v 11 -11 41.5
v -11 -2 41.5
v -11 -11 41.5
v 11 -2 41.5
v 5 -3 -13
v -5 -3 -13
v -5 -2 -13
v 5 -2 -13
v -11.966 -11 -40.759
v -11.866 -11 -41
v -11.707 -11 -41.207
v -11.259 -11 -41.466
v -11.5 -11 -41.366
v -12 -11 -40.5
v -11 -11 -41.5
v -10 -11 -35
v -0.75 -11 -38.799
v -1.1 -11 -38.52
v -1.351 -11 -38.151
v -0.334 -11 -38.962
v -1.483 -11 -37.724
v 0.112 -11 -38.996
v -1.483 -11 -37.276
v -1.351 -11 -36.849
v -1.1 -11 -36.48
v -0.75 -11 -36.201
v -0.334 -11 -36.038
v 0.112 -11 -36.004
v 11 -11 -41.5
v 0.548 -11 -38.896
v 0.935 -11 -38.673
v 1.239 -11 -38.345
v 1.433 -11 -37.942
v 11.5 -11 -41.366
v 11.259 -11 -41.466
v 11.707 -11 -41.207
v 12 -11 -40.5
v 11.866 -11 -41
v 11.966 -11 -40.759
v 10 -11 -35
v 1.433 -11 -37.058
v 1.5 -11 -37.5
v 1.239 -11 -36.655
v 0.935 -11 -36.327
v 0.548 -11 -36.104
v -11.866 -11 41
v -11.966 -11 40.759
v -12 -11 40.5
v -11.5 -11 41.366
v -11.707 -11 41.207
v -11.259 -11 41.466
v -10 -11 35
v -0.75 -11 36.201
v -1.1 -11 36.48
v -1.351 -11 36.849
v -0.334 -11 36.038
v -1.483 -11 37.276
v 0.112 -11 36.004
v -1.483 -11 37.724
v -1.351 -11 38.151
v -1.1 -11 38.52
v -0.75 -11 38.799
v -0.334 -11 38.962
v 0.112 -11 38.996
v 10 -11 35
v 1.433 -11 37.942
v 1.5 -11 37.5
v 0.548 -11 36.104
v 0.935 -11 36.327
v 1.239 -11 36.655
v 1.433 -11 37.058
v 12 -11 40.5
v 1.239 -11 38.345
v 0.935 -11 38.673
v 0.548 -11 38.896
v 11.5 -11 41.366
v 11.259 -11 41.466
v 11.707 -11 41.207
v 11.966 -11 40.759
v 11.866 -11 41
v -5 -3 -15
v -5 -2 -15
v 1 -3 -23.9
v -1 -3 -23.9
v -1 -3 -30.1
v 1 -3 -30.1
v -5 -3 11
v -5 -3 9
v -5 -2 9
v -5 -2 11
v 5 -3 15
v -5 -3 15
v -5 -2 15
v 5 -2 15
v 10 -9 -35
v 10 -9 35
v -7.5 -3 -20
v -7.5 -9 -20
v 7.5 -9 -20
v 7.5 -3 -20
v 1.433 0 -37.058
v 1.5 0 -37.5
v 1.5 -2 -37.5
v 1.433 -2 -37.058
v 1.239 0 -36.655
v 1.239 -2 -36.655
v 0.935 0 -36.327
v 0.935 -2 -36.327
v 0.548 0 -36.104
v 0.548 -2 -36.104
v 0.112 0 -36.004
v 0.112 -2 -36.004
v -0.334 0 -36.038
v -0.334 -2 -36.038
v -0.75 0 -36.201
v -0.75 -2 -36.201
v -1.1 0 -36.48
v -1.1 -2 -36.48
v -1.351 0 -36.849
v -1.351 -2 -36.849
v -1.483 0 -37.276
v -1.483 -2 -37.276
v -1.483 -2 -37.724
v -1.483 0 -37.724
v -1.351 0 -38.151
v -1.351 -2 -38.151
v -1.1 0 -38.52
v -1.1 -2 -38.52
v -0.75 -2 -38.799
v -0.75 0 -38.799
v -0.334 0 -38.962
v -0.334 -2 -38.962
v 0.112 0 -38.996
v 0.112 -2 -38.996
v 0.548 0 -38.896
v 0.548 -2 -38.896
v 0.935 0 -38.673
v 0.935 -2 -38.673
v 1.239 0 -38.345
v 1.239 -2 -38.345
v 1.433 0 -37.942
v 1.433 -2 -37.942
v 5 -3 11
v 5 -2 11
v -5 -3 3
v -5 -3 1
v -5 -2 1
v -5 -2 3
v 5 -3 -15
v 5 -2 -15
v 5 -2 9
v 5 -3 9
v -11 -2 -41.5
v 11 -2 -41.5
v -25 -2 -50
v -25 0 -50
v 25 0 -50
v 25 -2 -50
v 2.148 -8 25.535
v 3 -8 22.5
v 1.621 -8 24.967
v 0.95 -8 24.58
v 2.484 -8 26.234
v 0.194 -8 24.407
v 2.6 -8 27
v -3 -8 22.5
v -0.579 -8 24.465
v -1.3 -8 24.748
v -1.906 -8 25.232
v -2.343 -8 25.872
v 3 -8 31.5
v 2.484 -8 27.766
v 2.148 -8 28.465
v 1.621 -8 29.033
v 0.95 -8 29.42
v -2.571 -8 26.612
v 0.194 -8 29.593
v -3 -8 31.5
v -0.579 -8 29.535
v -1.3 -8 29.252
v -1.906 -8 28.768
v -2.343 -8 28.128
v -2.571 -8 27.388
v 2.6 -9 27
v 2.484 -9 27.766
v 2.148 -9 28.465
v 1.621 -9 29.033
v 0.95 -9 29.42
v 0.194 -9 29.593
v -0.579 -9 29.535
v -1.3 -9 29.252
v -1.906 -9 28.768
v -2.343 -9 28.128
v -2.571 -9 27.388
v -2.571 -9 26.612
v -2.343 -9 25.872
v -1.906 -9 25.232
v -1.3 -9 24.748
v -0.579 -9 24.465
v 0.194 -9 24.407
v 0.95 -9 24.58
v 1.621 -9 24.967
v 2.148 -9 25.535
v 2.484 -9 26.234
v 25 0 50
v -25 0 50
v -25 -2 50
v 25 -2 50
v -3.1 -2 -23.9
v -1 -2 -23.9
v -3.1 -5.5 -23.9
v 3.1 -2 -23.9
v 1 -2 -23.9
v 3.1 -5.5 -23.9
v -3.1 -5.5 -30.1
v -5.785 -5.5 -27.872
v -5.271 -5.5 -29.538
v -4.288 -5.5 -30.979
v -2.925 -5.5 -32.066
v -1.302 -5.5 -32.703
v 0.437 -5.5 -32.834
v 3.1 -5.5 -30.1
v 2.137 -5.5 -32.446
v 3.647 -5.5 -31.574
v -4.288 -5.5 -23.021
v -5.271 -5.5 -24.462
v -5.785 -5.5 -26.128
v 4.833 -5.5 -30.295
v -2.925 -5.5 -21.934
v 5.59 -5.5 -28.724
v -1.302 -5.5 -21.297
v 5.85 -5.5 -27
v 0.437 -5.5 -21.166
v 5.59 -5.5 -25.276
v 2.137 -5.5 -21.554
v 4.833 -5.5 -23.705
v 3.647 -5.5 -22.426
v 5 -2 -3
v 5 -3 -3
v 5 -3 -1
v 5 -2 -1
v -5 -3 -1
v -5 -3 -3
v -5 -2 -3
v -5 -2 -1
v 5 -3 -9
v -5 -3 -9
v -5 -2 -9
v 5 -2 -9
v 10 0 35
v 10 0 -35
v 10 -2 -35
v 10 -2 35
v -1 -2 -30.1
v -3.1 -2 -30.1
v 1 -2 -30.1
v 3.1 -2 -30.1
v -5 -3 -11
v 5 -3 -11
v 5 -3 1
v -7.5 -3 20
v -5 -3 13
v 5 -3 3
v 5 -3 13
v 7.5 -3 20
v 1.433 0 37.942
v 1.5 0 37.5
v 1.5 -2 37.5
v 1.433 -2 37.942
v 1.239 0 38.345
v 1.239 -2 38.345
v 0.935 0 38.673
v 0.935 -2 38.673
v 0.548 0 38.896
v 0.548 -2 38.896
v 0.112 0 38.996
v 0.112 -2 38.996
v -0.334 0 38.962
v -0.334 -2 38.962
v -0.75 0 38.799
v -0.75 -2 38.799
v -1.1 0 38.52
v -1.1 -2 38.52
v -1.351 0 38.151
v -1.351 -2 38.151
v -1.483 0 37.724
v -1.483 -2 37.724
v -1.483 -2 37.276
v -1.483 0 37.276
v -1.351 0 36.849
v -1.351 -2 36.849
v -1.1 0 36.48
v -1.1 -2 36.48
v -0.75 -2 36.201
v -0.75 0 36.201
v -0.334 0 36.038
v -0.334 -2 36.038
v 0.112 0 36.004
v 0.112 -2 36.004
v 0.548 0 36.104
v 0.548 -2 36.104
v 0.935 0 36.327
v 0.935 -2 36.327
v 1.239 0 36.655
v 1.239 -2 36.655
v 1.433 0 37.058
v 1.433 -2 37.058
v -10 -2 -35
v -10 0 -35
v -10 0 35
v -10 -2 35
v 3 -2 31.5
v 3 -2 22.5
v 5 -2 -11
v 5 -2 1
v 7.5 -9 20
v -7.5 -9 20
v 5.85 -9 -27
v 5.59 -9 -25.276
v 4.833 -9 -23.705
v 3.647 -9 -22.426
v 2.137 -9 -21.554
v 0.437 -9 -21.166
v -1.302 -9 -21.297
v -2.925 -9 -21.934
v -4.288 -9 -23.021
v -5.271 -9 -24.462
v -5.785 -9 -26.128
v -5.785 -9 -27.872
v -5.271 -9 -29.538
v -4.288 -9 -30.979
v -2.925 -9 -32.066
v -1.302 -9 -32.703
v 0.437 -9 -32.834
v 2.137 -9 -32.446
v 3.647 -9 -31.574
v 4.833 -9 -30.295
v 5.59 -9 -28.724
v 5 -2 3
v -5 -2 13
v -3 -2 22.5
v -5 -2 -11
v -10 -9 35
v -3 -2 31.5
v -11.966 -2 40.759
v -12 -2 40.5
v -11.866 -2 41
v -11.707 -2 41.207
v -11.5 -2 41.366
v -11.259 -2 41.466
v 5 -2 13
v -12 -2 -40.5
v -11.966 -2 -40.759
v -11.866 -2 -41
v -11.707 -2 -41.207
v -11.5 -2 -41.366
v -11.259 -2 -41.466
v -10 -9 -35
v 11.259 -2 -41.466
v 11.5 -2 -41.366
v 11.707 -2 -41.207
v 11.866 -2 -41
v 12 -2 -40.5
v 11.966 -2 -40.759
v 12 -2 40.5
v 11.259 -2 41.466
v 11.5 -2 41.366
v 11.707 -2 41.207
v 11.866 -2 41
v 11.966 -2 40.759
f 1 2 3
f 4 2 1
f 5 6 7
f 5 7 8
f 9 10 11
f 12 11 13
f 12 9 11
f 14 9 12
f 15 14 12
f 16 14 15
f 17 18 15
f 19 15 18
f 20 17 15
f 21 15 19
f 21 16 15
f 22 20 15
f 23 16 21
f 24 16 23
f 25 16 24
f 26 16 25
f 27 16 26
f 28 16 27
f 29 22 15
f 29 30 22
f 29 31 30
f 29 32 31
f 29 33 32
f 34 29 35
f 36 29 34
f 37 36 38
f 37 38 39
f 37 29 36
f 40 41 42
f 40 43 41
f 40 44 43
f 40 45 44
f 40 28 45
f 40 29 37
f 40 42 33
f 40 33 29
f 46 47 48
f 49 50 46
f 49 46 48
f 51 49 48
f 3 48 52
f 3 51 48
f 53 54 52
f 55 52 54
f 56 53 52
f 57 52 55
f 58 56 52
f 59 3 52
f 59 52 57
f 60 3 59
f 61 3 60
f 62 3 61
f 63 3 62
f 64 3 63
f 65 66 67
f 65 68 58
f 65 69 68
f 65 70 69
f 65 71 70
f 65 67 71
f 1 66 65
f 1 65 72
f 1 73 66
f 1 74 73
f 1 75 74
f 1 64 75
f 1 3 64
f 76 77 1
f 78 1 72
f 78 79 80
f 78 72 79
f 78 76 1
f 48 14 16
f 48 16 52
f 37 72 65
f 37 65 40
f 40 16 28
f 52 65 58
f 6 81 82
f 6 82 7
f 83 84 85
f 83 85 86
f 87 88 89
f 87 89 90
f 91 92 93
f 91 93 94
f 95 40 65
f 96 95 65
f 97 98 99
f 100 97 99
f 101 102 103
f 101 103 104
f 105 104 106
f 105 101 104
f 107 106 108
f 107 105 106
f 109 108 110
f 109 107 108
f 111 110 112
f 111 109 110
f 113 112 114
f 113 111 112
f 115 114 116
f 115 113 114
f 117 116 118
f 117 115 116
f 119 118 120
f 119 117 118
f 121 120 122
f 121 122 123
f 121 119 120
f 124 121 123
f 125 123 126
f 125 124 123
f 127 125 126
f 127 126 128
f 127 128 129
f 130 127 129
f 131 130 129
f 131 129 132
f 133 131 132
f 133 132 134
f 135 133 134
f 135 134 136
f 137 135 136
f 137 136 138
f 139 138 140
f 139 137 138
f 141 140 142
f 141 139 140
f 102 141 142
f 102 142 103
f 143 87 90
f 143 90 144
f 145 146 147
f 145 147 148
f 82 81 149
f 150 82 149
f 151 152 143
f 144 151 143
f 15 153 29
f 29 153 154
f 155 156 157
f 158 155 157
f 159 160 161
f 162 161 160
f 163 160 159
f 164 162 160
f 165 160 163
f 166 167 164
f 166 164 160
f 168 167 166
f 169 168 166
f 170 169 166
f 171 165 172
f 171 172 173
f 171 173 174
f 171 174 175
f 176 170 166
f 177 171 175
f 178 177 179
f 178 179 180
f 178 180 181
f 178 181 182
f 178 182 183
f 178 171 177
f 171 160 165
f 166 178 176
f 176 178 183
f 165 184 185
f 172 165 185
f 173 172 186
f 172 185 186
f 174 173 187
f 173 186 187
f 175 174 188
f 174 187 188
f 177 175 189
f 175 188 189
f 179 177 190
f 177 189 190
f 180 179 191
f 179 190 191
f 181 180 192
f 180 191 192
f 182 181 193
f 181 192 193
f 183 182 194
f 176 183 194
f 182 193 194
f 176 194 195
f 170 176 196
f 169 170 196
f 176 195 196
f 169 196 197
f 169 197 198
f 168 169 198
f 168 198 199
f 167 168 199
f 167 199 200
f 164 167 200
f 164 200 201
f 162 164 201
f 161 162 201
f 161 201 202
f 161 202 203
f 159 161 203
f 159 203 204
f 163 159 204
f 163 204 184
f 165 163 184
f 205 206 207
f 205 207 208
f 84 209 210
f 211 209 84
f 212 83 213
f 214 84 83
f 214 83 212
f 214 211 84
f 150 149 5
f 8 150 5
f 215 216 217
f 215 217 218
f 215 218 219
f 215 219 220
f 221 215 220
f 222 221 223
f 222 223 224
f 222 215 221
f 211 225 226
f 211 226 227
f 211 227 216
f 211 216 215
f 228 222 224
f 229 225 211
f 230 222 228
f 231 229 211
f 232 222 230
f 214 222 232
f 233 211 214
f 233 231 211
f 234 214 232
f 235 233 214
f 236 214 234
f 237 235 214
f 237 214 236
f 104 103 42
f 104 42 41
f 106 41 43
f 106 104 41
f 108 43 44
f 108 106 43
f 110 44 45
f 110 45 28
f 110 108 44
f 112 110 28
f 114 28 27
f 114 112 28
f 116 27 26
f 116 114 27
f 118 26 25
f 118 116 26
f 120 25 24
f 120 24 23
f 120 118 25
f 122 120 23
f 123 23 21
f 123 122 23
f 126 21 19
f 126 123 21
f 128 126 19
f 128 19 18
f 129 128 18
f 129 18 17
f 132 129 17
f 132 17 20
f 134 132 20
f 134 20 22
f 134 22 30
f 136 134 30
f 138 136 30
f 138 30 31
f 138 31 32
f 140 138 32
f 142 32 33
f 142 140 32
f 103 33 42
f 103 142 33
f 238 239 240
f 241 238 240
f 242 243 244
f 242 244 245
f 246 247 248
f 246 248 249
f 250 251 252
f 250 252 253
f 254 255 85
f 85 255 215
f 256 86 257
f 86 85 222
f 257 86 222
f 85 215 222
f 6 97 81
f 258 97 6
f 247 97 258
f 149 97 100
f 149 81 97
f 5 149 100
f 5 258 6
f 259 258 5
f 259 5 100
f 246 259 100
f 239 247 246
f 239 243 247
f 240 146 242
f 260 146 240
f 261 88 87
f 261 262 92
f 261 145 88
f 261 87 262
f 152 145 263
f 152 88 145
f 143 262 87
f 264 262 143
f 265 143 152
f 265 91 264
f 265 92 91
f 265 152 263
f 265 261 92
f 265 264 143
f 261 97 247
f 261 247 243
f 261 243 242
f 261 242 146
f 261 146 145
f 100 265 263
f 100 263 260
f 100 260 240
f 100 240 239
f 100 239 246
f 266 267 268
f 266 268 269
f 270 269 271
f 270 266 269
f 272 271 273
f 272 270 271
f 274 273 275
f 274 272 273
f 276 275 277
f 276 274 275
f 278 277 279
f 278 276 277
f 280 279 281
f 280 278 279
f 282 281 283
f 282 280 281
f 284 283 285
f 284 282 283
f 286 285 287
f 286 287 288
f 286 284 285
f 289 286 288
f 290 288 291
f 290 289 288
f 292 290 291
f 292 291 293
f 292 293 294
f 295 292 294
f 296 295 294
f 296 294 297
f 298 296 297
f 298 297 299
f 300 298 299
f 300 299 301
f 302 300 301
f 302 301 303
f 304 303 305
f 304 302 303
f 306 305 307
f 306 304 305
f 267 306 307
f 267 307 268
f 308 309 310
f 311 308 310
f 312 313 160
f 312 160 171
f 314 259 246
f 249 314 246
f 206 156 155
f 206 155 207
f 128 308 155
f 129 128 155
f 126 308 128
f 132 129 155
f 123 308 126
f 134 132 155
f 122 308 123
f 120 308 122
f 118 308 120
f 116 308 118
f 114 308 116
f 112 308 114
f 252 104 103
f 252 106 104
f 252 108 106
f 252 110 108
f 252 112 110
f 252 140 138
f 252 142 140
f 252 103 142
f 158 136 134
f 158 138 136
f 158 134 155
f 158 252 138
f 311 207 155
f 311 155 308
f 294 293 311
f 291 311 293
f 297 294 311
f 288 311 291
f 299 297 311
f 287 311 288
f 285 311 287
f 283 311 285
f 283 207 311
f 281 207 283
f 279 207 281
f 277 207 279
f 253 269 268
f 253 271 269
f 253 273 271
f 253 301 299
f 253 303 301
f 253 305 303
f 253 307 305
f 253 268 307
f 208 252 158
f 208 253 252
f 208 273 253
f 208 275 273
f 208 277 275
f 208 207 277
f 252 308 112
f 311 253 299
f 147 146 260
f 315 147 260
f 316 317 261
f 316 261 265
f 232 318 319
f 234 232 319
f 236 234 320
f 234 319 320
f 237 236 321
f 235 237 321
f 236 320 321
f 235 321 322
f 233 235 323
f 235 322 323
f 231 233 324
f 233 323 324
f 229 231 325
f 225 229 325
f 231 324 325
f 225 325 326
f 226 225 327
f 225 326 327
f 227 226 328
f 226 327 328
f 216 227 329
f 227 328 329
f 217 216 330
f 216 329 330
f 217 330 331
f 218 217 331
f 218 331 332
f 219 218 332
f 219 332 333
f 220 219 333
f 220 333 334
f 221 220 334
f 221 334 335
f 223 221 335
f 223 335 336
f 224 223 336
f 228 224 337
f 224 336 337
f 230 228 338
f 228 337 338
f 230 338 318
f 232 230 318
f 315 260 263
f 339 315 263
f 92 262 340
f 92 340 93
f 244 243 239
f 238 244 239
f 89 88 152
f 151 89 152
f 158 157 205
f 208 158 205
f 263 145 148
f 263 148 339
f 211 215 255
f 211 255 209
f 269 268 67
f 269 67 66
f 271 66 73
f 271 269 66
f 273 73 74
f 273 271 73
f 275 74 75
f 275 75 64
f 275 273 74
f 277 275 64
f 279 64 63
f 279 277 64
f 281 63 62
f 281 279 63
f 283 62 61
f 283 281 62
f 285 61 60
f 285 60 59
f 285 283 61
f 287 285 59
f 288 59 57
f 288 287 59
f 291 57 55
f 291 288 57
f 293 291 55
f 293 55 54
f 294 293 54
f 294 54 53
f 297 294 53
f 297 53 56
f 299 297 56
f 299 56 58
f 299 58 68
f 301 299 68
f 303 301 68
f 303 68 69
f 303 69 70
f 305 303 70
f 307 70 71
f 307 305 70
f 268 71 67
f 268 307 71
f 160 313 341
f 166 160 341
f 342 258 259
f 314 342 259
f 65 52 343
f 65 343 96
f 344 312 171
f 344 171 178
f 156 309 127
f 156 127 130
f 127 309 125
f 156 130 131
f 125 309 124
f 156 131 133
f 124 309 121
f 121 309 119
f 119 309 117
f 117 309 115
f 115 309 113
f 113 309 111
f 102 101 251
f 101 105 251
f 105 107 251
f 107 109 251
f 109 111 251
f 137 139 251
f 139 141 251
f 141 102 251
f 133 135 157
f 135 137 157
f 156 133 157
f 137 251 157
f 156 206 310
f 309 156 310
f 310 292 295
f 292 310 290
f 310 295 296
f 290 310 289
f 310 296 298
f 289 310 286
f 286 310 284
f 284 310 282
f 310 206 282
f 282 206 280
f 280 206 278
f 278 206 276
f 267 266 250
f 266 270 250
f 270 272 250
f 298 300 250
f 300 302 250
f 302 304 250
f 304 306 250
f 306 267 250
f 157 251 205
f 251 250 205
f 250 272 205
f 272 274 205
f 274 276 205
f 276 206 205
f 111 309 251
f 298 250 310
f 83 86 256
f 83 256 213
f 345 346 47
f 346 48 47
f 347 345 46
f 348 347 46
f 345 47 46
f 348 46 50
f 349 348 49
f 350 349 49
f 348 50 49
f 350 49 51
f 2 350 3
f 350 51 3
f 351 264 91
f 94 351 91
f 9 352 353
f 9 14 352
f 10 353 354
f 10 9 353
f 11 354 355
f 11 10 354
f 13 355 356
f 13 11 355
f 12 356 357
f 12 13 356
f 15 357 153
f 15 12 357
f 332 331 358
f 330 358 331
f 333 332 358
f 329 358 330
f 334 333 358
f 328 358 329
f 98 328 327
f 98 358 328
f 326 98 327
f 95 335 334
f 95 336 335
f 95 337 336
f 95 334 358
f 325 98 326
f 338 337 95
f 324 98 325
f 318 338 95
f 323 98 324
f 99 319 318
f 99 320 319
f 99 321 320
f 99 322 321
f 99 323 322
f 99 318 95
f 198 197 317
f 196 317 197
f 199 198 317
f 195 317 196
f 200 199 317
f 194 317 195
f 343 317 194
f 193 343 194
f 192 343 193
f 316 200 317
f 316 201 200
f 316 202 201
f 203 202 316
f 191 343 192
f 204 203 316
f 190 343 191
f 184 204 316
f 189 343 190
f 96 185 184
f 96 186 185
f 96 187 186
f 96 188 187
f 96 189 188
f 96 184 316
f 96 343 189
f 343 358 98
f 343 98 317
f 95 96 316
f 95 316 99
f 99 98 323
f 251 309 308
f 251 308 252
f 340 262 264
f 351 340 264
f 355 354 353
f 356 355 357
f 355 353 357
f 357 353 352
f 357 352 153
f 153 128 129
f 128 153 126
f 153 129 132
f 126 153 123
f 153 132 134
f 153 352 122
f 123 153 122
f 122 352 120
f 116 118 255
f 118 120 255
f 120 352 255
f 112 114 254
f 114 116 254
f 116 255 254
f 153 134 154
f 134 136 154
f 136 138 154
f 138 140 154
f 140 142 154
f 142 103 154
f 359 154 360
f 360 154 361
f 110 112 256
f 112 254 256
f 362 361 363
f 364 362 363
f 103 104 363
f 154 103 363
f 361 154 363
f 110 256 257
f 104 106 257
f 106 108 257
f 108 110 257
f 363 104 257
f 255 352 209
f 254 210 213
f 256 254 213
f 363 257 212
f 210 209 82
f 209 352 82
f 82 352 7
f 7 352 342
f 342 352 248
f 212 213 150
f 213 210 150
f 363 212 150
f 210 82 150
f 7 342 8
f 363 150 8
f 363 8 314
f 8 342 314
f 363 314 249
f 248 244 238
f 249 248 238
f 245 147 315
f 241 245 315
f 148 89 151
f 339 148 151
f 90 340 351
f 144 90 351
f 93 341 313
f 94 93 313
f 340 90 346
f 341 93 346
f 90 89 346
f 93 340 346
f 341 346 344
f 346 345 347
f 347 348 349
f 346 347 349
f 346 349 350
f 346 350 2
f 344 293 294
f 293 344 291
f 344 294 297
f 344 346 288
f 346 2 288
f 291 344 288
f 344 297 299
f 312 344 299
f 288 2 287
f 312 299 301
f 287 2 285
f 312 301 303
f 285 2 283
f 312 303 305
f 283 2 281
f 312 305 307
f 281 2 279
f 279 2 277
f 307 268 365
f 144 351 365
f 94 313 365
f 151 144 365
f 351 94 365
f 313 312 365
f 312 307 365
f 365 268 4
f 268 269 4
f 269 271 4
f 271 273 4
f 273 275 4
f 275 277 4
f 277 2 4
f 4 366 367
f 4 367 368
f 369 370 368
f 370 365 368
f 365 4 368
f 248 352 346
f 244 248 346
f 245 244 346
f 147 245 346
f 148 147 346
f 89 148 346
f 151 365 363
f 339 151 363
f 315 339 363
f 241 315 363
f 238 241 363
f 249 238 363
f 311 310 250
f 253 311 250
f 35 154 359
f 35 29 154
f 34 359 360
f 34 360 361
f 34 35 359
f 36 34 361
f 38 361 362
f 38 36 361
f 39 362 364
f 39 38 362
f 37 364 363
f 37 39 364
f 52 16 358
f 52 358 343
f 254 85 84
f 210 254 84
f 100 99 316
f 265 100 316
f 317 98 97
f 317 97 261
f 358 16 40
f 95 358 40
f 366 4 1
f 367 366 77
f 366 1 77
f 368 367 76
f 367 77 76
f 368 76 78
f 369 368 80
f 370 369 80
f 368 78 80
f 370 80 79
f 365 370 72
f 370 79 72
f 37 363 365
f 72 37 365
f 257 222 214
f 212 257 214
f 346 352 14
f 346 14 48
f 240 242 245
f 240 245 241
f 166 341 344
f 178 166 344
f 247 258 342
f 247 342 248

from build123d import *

# Parameters (mm, degrees)
F0_W      = 50
F0_H      = 100
F0_R      = 1.5
F0_W_2    = 20
F0_H_2    = 70
F1_DEPTH  = 2
F2_W      = 24
F2_H      = 83
F2_R      = 1.5
F3_DEPTH  = 9
F4_W      = 20
F4_H      = 70
F5_DEPTH  = 14
F7_W      = 20
F7_H      = 70
F8_DEPTH  = 7
F9_R      = 2.6
F10_DEPTH = 5
F11_W     = 6
F11_H     = 9
F12_DEPTH = 6
F13_W     = 10
F13_H     = 2
F14_DEPTH = 10
F15_W     = 15
F15_H     = 40
F16_DEPTH = 6
F17_W     = 6.2
F17_H     = 6.2
F18_DEPTH = 6
F19_W     = 2.1
F19_H     = 6.2
F20_DEPTH = 1
F21_R     = 5.85
F22_DEPTH = 3.5
F23_R     = 1


with BuildPart() as f1:
    # F0 (on Front) → F1 (new body)
    with BuildSketch(Plane.XZ):
        Rectangle(F0_W, F0_H)
        with Locations((0, -37.5)):
            Circle(F0_R, mode=Mode.SUBTRACT)
        Rectangle(F0_W_2, F0_H_2, mode=Mode.SUBTRACT)
        with Locations((0, 37.5)):
            Circle(F0_R, mode=Mode.SUBTRACT)
    extrude(amount=F1_DEPTH)


with BuildPart() as f3:
    # F2 (on face) → F3 (new body)
    with BuildSketch(Plane.XZ.offset(2)):
        Rectangle(F2_W, F2_H)
        with Locations((0, -37.5)):
            Circle(F2_R, mode=Mode.SUBTRACT)
        with Locations((0, 37.5)):
            Circle(F2_R, mode=Mode.SUBTRACT)
    extrude(amount=F3_DEPTH)

    # F4 (on face) → F5 (cut)
    with BuildSketch(Plane.XZ.offset(11)):
        Rectangle(F4_W, F4_H)
    extrude(amount=-F5_DEPTH, mode=Mode.SUBTRACT)

    # F7 (on offset) → F8 (join)
    with BuildSketch(Plane.XZ.offset(2)):
        Rectangle(F7_W, F7_H)
    extrude(amount=F8_DEPTH)

    # F9 (on face) → F10 (cut)
    with BuildSketch(Plane.XZ.offset(9)):
        with Locations((0, 27)):
            Circle(F9_R)
    extrude(amount=-F10_DEPTH, mode=Mode.SUBTRACT)

    # F11 (on face) → F12 (cut)
    with BuildSketch(Plane(origin=(0, -2, 0), x_dir=(-1, 0, 0), z_dir=(0, 1, 0))):
        with Locations((0, 27)):
            Rectangle(F11_W, F11_H)
    extrude(amount=-F12_DEPTH, mode=Mode.SUBTRACT)

    # F13 (on face) → F14 (cut)
    with BuildSketch(Plane.XZ.offset(9)):
        with Locations((0, 14)):
            Rectangle(F13_W, F13_H)
        with Locations((0, 10)):
            Rectangle(F13_W, F13_H)
        with Locations((0, 2)):
            Rectangle(F13_W, F13_H)
        with Locations((0, -2)):
            Rectangle(F13_W, F13_H)
        with Locations((0, -10)):
            Rectangle(F13_W, F13_H)
        with Locations((0, -14)):
            Rectangle(F13_W, F13_H)
    extrude(amount=-F14_DEPTH, mode=Mode.SUBTRACT)

    # F15 (on face) → F16 (cut)
    with BuildSketch(Plane.XZ.offset(9)):
        Rectangle(F15_W, F15_H)
    extrude(amount=-F16_DEPTH, mode=Mode.SUBTRACT)

    # F17 (on face) → F18 (cut)
    with BuildSketch(Plane.XZ.offset(9)):
        with Locations((0, -27)):
            Rectangle(F17_W, F17_H)
    extrude(amount=-F18_DEPTH, mode=Mode.SUBTRACT)

    # F19 (on face) → F20 (cut)
    with BuildSketch(Plane.XZ.offset(3)):
        with Locations((-2.05, -27)):
            Rectangle(F19_W, F19_H)
        with Locations((2.05, -27)):
            Rectangle(F19_W, F19_H)
    extrude(amount=-F20_DEPTH, mode=Mode.SUBTRACT)

    # F21 (on face) → F22 (cut)
    with BuildSketch(Plane.XZ.offset(9)):
        with Locations((0, -27)):
            Circle(F21_R)
    extrude(amount=-F22_DEPTH, mode=Mode.SUBTRACT)

    # F23
    f23_edges = [f3.edges().sort_by_distance(p)[0] for p in [
        (-12, -6.5, -41.5),
        (12, -6.5, -41.5),
        (-12, -6.5, 41.5),
        (12, -6.5, 41.5),
    ]]
    fillet(f23_edges, radius=F23_R)


solid = Compound([f1.part, f3.part])
